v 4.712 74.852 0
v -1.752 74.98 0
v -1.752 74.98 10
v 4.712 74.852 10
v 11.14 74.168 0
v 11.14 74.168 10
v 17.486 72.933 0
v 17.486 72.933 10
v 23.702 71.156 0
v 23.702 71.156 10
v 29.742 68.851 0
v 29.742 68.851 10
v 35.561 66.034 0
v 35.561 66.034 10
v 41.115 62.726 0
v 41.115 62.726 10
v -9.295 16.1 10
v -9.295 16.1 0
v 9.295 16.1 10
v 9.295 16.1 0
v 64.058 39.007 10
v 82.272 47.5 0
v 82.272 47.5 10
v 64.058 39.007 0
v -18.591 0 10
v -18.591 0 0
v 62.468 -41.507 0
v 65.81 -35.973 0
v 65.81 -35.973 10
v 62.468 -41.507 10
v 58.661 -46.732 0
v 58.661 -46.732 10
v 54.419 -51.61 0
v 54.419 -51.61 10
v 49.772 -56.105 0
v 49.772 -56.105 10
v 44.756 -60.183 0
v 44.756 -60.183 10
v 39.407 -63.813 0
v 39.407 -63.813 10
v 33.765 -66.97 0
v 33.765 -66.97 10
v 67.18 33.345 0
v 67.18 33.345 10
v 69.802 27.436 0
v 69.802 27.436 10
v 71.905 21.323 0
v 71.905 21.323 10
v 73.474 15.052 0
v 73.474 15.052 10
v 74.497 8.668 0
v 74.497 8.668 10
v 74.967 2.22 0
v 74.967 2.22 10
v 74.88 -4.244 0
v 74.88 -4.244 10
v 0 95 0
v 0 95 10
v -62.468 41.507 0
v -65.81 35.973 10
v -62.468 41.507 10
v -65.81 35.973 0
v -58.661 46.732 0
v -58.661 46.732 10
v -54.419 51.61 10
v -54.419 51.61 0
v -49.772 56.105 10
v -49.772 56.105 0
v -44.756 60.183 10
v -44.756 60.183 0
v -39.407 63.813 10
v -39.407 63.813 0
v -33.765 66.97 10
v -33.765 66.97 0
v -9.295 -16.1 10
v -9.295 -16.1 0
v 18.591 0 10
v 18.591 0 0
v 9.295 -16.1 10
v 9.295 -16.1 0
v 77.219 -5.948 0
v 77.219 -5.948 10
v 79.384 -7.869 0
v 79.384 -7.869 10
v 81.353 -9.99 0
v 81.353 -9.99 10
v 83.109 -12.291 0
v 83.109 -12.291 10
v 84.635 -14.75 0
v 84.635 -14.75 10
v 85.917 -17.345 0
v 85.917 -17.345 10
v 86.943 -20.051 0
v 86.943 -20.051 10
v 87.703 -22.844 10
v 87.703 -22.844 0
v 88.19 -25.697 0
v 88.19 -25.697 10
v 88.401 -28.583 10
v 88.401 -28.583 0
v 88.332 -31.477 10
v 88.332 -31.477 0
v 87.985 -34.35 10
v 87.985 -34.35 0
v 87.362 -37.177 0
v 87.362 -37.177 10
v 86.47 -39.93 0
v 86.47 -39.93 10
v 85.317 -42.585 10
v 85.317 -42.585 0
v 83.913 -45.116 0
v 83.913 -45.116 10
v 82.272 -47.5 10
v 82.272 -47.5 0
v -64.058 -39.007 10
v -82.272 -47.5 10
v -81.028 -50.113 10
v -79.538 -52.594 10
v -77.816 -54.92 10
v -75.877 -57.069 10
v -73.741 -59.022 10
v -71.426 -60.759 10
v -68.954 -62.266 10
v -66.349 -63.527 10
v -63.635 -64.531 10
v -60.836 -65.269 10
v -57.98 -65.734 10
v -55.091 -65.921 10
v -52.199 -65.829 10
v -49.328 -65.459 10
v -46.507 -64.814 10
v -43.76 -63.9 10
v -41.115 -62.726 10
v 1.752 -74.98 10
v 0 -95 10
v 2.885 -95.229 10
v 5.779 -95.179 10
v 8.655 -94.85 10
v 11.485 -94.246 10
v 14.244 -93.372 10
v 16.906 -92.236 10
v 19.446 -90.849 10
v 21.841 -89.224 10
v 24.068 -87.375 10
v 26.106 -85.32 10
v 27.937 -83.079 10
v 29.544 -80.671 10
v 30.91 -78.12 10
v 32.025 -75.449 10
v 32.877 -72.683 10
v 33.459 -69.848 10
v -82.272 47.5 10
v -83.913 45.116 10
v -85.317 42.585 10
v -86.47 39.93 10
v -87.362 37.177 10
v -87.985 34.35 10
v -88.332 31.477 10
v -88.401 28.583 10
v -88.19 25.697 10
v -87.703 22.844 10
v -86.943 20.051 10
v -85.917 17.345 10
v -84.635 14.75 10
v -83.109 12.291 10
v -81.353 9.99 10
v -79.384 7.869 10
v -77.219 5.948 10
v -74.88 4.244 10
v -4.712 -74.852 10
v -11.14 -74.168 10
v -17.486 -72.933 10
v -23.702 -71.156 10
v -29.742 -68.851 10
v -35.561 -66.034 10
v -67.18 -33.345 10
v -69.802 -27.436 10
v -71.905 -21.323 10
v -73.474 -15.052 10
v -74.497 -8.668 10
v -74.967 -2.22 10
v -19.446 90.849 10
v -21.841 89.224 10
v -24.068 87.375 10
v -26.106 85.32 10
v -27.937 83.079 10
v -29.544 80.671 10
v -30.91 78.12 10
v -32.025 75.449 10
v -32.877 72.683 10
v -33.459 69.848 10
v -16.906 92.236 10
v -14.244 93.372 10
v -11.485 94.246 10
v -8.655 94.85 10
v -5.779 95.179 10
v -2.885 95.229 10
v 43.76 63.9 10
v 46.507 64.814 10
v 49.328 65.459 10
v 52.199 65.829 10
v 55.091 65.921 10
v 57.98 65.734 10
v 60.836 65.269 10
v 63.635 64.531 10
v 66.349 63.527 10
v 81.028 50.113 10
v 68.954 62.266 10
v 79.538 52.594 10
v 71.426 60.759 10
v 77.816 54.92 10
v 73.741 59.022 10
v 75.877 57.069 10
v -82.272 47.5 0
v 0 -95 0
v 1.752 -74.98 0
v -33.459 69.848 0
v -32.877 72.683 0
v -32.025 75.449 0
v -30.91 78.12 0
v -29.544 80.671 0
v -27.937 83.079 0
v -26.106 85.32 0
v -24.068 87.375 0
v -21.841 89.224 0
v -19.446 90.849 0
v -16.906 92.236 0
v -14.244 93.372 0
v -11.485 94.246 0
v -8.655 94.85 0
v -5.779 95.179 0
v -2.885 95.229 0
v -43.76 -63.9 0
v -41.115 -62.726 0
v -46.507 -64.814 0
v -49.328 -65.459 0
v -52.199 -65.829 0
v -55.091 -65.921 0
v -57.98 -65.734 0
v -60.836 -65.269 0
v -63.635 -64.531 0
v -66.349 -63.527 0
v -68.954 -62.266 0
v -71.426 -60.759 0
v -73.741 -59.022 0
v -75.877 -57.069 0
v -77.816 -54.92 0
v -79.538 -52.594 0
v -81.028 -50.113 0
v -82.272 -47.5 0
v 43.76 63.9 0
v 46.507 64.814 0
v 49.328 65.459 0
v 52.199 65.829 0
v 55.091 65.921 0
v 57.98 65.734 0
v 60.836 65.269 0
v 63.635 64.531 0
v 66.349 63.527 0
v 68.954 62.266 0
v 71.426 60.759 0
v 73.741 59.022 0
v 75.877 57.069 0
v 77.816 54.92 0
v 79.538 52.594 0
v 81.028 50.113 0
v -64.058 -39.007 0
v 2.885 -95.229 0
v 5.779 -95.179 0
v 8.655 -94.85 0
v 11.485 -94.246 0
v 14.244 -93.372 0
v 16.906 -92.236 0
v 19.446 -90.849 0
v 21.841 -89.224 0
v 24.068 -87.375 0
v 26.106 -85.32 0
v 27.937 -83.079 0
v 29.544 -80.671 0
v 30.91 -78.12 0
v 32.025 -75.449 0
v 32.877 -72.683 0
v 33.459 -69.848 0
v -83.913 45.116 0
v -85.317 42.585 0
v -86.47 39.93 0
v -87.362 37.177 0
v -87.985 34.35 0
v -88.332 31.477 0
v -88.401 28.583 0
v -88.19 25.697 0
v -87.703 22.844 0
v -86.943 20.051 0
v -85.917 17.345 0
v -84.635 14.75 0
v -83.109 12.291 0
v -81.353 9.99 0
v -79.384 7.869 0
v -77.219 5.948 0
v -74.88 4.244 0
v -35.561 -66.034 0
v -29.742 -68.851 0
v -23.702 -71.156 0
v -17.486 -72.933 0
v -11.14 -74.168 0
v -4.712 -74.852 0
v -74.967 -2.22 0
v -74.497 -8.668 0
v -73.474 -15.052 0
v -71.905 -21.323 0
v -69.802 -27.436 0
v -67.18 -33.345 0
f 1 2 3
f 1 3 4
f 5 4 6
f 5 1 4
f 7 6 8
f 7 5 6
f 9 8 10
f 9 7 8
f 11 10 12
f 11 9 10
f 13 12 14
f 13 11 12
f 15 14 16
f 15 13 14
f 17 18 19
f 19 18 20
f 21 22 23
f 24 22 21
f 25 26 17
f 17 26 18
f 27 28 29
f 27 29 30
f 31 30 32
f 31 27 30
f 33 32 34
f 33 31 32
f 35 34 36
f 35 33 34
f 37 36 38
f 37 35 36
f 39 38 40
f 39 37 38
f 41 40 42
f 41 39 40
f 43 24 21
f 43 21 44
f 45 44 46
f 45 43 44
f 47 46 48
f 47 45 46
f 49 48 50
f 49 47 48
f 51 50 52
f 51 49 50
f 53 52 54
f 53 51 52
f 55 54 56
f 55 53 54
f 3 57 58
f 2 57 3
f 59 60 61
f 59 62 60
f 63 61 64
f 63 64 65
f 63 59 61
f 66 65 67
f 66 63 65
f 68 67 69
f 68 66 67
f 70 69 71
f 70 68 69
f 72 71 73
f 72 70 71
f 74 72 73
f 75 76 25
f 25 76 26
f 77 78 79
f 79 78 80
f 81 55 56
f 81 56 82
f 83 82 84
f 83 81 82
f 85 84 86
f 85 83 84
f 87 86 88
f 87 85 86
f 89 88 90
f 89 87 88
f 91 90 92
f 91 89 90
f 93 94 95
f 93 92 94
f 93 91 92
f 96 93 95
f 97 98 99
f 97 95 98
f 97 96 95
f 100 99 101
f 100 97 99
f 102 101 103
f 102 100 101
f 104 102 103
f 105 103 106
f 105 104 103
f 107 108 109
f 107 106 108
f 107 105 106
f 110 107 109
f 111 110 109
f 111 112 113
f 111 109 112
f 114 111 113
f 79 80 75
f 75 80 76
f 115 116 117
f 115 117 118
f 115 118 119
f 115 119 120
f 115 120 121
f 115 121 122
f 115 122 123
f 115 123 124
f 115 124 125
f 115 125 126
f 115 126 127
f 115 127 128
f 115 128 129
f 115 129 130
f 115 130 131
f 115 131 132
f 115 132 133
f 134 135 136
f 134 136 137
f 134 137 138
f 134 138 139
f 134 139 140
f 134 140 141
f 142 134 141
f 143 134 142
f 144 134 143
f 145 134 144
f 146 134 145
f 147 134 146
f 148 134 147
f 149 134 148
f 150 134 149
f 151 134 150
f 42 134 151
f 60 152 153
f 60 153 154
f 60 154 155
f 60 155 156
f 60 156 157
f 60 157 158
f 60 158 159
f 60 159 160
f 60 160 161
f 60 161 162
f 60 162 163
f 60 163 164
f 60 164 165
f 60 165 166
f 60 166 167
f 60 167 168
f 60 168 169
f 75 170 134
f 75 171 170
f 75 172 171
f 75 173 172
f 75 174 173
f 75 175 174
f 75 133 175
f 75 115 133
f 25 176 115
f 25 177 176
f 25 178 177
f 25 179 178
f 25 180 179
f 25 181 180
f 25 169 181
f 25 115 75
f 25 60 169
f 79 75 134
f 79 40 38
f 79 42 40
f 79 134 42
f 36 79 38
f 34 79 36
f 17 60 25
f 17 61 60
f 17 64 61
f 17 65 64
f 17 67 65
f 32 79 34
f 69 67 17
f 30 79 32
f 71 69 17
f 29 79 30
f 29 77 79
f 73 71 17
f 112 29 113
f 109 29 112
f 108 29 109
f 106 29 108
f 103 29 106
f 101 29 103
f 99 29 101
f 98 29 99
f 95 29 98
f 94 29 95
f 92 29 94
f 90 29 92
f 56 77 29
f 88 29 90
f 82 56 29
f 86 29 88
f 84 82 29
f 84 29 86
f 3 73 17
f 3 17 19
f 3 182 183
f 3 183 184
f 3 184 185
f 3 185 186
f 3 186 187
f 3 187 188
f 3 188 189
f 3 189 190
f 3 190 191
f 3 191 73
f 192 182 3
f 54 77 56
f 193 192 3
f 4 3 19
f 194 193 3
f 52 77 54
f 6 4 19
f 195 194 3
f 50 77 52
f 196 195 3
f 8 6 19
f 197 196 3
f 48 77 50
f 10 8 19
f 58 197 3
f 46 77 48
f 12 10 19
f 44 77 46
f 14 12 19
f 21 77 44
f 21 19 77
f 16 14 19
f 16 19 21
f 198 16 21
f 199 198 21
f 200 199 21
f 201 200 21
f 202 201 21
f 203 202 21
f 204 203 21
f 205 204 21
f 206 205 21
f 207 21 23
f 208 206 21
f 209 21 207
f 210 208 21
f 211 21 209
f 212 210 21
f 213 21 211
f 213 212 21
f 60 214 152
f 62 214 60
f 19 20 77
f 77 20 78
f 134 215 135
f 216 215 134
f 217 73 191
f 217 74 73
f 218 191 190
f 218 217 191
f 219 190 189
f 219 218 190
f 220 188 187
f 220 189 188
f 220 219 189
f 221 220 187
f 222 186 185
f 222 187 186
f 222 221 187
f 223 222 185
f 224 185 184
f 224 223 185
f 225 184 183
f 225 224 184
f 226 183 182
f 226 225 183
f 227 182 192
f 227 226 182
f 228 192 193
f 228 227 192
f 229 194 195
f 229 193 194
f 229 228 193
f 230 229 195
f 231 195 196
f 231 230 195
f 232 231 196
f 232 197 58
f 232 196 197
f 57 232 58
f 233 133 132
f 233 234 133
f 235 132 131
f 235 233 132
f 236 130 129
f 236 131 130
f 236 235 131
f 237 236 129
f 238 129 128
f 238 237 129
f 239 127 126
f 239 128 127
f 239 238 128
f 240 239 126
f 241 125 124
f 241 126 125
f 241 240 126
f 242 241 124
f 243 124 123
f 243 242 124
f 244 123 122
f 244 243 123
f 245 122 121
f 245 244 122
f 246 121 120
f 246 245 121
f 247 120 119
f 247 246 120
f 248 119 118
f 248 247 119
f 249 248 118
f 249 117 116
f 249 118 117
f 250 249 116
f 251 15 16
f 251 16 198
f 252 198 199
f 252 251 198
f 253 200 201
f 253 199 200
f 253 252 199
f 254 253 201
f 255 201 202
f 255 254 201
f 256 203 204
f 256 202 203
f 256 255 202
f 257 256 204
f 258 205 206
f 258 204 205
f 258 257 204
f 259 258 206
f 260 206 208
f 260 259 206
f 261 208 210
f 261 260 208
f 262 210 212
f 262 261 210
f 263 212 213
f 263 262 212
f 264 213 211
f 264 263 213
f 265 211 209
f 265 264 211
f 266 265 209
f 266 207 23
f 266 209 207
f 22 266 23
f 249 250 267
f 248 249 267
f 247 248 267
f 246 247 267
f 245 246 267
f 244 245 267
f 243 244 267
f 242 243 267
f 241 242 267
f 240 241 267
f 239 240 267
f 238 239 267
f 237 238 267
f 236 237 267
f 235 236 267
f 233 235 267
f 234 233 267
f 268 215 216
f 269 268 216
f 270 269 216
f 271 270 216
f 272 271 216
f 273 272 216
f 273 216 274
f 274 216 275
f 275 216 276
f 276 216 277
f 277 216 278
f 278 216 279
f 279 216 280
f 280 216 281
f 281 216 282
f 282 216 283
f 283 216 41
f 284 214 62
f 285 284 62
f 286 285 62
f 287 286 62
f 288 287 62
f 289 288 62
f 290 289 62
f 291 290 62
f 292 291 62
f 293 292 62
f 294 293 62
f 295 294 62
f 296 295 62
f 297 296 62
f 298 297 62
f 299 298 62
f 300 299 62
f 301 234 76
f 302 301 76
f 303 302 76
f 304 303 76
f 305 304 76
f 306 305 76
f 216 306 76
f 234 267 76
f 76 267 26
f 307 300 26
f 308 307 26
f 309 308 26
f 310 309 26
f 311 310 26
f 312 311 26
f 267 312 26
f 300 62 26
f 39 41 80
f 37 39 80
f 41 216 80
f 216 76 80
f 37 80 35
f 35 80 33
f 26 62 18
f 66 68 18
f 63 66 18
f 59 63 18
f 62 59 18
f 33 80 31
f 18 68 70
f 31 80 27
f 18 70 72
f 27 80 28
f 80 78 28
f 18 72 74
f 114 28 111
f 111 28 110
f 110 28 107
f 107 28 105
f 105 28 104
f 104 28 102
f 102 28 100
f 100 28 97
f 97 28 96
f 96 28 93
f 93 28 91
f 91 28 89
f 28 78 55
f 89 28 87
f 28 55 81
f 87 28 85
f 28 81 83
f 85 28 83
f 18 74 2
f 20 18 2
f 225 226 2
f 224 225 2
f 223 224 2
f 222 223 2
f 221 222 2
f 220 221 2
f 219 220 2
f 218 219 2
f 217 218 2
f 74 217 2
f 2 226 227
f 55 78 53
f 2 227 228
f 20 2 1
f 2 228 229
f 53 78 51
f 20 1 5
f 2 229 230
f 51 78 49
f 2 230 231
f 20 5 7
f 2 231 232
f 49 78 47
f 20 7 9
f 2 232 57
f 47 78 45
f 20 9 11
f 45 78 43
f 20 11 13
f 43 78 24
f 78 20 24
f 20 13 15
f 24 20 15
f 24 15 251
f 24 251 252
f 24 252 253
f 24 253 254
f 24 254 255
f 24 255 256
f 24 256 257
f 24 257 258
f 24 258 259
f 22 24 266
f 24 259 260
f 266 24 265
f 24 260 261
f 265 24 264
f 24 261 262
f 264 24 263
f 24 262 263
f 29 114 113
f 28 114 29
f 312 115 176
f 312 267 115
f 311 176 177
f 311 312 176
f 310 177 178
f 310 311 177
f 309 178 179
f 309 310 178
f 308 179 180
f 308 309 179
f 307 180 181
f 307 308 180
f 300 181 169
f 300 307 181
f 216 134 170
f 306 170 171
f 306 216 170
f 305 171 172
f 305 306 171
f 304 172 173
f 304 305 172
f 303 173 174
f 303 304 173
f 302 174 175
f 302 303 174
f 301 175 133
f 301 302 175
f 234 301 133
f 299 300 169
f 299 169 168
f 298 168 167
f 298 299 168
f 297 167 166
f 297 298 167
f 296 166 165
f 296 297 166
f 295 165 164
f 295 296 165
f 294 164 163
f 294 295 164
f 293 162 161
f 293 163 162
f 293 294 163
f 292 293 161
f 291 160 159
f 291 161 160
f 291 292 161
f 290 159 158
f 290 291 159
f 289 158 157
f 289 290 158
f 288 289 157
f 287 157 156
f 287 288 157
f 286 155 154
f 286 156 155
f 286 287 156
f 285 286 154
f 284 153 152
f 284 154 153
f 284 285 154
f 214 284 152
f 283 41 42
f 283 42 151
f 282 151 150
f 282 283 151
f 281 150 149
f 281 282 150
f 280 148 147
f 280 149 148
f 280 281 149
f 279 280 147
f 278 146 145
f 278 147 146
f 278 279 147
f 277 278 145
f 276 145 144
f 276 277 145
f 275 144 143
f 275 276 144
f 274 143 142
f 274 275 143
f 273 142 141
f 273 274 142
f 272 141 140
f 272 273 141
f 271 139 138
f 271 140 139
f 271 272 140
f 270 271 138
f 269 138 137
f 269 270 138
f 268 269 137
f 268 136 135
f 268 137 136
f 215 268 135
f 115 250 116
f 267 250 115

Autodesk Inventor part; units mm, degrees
ref_plane "YZ Plane" through (0, 0, 0) normal (1, 0, 0) x (0, 1, 0)
ref_plane "XZ Plane" through (0, 0, 0) normal (0, 1, 0) x (-1, 0, 0)
ref_plane "XY Plane" through (0, 0, 0) normal (0, 0, 1) x (1, 0, 0)
sketch "Sketch1" plane through (0, 0, 0) normal (0, 0, 1) x (1, 0, 0)
  line L0 (-9.2953, -16.1) -> (-18.5907, 0)
  line L1 (-18.5907, 0) -> (-9.2953, 16.1)
  line L2 (-9.2953, 16.1) -> (9.2953, 16.1)
  line L3 (9.2953, 16.1) -> (18.5907, 0)
  line L4 (18.5907, 0) -> (9.2953, -16.1)
  line L5 (9.2953, -16.1) -> (-9.2953, -16.1)
  circle A0 centre (0, 0) radius 75
  dimension "d0" = 32.2
  dimension "d2" = 150
extrude "Extrusion1" add sketch "Sketch1" along normal blind 10
sketch "Sketch2" plane through (0, 0, 0) normal (0, 0, 1) x (1, 0, 0)
  circle A0 centre (0, 0) radius 75 projected
  line L0 (0, 0) -> (0, 75) construction
  line L1 (0, 95) -> (-15.0761, 73.4691) construction
  line L2 (0, 95) -> (-1.7516, 74.9795)
  circle A1 centre (0, 0) radius 75 projected
  arc A2 (0, 95) -> (-33.7647, 66.9697) centre (-3.8144, 65.2435) ccw
  line L3 (0, 75) -> (0, 95) construction
  point P0 (-1.7516, 74.9795)
  point P1 (-33.7647, 66.9697)
  dimension "d5" = 5
  dimension "d8" = 35
  dimension "d14" = 30
  dimension "d15" = 33
  dimension "d16" = 20
extrude "Extrusion2" add sketch "Sketch2" along normal blind 10 contours A0 A2 L2
pattern_circular "Circular Pattern1" count 6 over 360 about axis through (0, 0, -10) along (0, 0, 1) of "Extrusion2"
equation "\"BendReliefDepth\" = 0.5 * Thickness"
equation "\"Thickness\" = 10"
properties part number "NVPH-202 shredder cutter blade" material "Steel"
